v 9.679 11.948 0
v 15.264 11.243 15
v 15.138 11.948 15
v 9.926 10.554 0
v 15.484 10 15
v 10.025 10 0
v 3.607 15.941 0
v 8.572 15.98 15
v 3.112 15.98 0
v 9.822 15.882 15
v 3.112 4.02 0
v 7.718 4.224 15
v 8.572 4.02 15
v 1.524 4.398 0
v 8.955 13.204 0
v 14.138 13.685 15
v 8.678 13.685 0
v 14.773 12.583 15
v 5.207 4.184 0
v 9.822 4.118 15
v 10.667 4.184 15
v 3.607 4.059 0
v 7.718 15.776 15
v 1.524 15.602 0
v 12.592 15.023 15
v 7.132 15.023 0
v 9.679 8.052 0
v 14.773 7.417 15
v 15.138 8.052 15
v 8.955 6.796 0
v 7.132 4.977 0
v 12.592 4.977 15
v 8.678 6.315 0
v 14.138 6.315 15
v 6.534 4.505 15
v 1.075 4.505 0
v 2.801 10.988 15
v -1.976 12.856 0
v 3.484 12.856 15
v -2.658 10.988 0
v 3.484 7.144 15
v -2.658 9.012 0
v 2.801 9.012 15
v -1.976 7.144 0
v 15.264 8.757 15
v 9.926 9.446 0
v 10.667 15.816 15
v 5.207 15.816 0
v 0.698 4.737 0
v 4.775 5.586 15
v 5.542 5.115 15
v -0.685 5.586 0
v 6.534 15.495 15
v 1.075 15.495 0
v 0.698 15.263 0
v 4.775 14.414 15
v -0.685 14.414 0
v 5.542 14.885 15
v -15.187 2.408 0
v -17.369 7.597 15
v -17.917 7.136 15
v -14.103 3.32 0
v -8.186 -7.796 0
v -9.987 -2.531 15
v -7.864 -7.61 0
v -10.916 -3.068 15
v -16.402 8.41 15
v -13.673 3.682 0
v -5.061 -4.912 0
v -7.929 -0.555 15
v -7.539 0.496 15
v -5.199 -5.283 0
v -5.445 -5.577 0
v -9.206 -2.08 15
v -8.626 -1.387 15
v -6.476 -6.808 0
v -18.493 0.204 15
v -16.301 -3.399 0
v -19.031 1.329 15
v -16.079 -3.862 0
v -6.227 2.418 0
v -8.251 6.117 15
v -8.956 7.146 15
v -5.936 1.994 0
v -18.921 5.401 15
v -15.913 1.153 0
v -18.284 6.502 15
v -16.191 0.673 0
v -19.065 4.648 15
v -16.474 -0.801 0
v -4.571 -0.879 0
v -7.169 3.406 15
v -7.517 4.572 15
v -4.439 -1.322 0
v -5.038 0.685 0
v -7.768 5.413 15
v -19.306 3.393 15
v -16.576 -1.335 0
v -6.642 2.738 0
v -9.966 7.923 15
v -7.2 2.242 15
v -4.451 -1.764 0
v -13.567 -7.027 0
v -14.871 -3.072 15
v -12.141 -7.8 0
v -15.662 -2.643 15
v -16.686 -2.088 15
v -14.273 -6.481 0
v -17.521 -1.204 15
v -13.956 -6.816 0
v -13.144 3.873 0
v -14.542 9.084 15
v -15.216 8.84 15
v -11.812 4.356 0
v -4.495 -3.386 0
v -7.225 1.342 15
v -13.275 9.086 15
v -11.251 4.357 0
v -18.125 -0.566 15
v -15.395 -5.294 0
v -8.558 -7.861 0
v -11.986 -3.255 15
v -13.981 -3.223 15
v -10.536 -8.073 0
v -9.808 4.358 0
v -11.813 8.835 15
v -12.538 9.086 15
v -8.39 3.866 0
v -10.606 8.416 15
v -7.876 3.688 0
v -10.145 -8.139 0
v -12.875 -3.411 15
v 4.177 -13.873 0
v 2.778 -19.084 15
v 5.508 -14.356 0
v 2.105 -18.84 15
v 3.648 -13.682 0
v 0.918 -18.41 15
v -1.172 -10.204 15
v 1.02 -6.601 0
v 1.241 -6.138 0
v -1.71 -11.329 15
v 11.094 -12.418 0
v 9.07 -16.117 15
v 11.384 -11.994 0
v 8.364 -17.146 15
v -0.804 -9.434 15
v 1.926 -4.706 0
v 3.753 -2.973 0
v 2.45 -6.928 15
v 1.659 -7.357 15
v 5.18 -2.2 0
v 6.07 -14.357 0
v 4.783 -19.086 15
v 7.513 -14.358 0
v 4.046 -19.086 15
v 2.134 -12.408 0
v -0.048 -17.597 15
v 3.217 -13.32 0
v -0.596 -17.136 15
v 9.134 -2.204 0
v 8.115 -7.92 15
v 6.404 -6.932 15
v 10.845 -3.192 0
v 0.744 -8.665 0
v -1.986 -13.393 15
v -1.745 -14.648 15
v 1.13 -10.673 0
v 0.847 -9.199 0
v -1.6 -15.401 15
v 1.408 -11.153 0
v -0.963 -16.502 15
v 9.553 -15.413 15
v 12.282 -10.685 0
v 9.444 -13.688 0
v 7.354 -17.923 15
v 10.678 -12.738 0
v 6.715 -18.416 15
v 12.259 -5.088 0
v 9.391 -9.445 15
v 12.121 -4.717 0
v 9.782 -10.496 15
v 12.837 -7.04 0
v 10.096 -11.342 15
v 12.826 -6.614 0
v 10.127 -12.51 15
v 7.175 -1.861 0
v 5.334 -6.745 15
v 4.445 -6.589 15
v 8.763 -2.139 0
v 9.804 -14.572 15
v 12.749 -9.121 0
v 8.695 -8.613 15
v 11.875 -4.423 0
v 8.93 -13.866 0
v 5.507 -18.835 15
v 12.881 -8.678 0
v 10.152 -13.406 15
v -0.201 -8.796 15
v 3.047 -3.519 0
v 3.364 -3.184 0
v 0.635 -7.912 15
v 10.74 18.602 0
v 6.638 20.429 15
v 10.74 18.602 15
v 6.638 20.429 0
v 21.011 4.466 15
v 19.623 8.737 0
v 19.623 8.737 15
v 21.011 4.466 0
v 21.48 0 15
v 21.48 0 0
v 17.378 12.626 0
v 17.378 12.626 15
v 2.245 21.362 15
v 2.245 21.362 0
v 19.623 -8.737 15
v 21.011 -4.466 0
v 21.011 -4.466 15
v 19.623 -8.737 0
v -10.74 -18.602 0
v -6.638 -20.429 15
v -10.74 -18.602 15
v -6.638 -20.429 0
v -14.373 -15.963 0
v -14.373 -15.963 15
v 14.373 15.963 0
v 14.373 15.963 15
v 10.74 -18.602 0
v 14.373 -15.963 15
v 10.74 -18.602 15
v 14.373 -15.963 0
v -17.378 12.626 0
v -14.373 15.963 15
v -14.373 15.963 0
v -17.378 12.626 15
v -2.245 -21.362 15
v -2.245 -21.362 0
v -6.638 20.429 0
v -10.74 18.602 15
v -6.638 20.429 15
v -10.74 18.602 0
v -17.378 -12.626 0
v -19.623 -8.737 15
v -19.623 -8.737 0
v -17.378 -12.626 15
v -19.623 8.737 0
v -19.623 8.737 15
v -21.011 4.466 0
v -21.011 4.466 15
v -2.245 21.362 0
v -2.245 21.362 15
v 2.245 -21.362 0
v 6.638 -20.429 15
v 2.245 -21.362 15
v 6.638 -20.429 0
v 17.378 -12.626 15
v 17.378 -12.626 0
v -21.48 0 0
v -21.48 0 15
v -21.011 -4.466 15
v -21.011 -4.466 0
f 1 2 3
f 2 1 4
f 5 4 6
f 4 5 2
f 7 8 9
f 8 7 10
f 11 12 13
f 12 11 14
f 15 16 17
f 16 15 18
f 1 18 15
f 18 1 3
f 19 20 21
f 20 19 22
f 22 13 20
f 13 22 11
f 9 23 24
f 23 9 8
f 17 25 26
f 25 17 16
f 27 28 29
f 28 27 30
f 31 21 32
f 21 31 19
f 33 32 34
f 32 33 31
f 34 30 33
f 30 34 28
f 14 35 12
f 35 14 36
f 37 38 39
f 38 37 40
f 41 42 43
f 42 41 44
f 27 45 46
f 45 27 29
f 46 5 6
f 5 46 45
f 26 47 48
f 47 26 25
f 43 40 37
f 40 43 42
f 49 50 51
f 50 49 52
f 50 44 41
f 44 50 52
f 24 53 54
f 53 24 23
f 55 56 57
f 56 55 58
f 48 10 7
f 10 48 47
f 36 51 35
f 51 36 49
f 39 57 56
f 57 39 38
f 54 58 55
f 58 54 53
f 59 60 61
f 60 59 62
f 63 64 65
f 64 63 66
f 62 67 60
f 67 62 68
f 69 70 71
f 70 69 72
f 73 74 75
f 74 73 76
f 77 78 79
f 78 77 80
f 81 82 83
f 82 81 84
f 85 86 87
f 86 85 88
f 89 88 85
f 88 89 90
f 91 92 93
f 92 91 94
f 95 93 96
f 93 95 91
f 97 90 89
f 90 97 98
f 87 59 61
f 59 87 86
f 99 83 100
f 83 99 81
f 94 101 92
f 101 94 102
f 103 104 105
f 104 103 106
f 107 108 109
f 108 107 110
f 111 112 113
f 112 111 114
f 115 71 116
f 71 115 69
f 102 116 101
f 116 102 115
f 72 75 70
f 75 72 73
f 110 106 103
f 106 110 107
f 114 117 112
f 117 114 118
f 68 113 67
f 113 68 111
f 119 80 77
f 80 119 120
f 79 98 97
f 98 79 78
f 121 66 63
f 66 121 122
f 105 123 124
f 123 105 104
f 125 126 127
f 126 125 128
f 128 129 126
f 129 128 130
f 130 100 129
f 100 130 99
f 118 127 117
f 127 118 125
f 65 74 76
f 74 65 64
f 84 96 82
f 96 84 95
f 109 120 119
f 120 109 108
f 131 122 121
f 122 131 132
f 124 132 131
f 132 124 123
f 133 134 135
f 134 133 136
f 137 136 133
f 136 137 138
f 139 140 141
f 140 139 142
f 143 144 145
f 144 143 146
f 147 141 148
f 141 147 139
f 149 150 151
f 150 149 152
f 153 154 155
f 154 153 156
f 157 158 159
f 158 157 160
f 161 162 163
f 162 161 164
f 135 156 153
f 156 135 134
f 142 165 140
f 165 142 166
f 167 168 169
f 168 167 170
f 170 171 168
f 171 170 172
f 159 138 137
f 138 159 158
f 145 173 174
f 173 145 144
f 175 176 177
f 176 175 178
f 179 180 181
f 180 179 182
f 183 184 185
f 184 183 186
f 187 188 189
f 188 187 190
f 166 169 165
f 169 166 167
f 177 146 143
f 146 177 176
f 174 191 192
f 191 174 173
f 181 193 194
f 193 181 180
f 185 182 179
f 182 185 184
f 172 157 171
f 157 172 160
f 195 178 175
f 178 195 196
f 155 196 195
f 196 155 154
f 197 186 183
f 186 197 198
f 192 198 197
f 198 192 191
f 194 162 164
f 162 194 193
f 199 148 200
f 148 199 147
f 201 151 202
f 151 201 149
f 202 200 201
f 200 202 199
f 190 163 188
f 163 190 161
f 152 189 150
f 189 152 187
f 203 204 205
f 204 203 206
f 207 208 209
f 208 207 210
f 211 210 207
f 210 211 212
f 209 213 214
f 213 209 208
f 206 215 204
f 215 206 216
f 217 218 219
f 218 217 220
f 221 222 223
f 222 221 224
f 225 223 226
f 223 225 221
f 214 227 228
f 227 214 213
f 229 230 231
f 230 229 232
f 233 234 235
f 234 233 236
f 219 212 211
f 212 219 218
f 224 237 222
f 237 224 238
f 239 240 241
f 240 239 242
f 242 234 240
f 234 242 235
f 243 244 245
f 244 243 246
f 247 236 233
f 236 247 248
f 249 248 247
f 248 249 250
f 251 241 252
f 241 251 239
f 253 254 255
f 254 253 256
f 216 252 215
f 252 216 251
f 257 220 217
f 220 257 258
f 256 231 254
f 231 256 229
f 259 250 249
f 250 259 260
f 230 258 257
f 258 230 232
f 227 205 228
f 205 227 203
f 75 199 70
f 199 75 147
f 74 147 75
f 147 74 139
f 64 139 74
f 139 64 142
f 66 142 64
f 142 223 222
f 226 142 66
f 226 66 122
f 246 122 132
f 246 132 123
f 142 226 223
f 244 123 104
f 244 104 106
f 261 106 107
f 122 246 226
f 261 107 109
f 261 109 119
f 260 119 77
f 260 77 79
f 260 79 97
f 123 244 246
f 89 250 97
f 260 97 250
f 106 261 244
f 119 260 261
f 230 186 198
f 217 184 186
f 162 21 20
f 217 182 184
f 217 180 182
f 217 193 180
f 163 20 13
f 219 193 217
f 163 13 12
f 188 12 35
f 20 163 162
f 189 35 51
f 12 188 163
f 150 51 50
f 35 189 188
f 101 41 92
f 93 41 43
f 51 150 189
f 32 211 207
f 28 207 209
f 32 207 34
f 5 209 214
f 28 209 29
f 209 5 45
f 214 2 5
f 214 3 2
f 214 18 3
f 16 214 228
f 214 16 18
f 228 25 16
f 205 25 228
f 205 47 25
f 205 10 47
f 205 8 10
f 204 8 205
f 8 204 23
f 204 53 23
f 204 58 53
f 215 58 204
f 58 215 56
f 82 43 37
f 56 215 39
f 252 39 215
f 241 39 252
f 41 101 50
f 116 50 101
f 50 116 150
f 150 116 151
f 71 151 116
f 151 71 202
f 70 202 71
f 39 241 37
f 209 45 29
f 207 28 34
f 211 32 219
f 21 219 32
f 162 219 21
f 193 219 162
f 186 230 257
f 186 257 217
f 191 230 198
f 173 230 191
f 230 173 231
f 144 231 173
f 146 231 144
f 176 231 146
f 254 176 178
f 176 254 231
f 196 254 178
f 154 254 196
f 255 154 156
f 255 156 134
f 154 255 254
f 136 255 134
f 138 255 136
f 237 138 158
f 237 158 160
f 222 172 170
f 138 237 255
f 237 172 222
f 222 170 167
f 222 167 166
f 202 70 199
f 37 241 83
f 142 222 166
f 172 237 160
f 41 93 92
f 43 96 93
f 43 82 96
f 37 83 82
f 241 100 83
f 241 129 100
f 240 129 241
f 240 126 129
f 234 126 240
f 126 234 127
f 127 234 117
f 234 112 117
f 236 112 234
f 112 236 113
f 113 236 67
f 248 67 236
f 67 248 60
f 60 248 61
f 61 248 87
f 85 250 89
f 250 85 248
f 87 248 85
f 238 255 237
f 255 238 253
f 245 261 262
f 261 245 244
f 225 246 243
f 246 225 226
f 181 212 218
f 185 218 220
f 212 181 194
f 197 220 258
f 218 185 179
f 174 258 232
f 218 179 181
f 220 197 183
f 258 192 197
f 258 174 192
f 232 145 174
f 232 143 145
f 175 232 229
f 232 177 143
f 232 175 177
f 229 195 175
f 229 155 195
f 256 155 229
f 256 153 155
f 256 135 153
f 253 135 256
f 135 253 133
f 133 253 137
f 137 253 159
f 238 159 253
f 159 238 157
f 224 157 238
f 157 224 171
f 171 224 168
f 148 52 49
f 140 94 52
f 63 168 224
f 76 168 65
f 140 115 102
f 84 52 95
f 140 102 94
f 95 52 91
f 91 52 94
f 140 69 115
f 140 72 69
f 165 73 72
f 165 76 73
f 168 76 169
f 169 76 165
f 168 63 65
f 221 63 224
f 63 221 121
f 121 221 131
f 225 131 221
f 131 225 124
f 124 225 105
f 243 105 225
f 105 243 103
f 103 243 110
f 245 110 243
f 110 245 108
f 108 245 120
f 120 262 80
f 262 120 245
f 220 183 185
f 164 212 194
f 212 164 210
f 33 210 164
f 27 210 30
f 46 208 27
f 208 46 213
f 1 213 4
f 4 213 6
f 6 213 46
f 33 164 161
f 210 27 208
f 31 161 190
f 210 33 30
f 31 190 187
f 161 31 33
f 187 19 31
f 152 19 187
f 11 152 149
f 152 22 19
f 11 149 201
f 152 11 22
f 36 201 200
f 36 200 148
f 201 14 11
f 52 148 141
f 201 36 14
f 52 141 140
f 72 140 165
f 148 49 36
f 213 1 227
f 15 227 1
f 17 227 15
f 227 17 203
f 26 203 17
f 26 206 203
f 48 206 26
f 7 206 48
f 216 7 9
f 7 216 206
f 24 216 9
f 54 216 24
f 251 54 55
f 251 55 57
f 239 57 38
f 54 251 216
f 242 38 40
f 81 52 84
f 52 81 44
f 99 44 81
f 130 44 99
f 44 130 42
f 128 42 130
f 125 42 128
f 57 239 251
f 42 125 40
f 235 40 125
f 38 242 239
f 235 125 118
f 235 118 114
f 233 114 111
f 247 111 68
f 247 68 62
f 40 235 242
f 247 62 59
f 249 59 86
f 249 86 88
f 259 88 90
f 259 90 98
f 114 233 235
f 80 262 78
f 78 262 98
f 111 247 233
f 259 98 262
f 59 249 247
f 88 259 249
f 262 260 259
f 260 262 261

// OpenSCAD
number_of_holes=3; // [2:6]
hole_Angle=20; // [0:40]
hole_Size=12;
thickness=15;
additional_gerth=0;



divider=360/number_of_holes;
holeRadius=hole_Size/2;

if (hole_Angle > 20) 
{
  printitem(hole_Angle-20);
} else {
  printitem(0);
}






module printitem(invar) {
	pieceSize=(hole_Size*3.33)+number_of_holes+invar+additional_gerth;
	pieceRadius=pieceSize/2;
	difference(){
		cylinder(r=pieceRadius,h=thickness);
		for (a=[0:number_of_holes-1]) {
			rotate([0,0,divider*a])translate([0,hole_Size-(5-number_of_holes),-10])rotate([0,hole_Angle,0])cylinder(r=holeRadius,h=thickness*3);
		}

	}
}
